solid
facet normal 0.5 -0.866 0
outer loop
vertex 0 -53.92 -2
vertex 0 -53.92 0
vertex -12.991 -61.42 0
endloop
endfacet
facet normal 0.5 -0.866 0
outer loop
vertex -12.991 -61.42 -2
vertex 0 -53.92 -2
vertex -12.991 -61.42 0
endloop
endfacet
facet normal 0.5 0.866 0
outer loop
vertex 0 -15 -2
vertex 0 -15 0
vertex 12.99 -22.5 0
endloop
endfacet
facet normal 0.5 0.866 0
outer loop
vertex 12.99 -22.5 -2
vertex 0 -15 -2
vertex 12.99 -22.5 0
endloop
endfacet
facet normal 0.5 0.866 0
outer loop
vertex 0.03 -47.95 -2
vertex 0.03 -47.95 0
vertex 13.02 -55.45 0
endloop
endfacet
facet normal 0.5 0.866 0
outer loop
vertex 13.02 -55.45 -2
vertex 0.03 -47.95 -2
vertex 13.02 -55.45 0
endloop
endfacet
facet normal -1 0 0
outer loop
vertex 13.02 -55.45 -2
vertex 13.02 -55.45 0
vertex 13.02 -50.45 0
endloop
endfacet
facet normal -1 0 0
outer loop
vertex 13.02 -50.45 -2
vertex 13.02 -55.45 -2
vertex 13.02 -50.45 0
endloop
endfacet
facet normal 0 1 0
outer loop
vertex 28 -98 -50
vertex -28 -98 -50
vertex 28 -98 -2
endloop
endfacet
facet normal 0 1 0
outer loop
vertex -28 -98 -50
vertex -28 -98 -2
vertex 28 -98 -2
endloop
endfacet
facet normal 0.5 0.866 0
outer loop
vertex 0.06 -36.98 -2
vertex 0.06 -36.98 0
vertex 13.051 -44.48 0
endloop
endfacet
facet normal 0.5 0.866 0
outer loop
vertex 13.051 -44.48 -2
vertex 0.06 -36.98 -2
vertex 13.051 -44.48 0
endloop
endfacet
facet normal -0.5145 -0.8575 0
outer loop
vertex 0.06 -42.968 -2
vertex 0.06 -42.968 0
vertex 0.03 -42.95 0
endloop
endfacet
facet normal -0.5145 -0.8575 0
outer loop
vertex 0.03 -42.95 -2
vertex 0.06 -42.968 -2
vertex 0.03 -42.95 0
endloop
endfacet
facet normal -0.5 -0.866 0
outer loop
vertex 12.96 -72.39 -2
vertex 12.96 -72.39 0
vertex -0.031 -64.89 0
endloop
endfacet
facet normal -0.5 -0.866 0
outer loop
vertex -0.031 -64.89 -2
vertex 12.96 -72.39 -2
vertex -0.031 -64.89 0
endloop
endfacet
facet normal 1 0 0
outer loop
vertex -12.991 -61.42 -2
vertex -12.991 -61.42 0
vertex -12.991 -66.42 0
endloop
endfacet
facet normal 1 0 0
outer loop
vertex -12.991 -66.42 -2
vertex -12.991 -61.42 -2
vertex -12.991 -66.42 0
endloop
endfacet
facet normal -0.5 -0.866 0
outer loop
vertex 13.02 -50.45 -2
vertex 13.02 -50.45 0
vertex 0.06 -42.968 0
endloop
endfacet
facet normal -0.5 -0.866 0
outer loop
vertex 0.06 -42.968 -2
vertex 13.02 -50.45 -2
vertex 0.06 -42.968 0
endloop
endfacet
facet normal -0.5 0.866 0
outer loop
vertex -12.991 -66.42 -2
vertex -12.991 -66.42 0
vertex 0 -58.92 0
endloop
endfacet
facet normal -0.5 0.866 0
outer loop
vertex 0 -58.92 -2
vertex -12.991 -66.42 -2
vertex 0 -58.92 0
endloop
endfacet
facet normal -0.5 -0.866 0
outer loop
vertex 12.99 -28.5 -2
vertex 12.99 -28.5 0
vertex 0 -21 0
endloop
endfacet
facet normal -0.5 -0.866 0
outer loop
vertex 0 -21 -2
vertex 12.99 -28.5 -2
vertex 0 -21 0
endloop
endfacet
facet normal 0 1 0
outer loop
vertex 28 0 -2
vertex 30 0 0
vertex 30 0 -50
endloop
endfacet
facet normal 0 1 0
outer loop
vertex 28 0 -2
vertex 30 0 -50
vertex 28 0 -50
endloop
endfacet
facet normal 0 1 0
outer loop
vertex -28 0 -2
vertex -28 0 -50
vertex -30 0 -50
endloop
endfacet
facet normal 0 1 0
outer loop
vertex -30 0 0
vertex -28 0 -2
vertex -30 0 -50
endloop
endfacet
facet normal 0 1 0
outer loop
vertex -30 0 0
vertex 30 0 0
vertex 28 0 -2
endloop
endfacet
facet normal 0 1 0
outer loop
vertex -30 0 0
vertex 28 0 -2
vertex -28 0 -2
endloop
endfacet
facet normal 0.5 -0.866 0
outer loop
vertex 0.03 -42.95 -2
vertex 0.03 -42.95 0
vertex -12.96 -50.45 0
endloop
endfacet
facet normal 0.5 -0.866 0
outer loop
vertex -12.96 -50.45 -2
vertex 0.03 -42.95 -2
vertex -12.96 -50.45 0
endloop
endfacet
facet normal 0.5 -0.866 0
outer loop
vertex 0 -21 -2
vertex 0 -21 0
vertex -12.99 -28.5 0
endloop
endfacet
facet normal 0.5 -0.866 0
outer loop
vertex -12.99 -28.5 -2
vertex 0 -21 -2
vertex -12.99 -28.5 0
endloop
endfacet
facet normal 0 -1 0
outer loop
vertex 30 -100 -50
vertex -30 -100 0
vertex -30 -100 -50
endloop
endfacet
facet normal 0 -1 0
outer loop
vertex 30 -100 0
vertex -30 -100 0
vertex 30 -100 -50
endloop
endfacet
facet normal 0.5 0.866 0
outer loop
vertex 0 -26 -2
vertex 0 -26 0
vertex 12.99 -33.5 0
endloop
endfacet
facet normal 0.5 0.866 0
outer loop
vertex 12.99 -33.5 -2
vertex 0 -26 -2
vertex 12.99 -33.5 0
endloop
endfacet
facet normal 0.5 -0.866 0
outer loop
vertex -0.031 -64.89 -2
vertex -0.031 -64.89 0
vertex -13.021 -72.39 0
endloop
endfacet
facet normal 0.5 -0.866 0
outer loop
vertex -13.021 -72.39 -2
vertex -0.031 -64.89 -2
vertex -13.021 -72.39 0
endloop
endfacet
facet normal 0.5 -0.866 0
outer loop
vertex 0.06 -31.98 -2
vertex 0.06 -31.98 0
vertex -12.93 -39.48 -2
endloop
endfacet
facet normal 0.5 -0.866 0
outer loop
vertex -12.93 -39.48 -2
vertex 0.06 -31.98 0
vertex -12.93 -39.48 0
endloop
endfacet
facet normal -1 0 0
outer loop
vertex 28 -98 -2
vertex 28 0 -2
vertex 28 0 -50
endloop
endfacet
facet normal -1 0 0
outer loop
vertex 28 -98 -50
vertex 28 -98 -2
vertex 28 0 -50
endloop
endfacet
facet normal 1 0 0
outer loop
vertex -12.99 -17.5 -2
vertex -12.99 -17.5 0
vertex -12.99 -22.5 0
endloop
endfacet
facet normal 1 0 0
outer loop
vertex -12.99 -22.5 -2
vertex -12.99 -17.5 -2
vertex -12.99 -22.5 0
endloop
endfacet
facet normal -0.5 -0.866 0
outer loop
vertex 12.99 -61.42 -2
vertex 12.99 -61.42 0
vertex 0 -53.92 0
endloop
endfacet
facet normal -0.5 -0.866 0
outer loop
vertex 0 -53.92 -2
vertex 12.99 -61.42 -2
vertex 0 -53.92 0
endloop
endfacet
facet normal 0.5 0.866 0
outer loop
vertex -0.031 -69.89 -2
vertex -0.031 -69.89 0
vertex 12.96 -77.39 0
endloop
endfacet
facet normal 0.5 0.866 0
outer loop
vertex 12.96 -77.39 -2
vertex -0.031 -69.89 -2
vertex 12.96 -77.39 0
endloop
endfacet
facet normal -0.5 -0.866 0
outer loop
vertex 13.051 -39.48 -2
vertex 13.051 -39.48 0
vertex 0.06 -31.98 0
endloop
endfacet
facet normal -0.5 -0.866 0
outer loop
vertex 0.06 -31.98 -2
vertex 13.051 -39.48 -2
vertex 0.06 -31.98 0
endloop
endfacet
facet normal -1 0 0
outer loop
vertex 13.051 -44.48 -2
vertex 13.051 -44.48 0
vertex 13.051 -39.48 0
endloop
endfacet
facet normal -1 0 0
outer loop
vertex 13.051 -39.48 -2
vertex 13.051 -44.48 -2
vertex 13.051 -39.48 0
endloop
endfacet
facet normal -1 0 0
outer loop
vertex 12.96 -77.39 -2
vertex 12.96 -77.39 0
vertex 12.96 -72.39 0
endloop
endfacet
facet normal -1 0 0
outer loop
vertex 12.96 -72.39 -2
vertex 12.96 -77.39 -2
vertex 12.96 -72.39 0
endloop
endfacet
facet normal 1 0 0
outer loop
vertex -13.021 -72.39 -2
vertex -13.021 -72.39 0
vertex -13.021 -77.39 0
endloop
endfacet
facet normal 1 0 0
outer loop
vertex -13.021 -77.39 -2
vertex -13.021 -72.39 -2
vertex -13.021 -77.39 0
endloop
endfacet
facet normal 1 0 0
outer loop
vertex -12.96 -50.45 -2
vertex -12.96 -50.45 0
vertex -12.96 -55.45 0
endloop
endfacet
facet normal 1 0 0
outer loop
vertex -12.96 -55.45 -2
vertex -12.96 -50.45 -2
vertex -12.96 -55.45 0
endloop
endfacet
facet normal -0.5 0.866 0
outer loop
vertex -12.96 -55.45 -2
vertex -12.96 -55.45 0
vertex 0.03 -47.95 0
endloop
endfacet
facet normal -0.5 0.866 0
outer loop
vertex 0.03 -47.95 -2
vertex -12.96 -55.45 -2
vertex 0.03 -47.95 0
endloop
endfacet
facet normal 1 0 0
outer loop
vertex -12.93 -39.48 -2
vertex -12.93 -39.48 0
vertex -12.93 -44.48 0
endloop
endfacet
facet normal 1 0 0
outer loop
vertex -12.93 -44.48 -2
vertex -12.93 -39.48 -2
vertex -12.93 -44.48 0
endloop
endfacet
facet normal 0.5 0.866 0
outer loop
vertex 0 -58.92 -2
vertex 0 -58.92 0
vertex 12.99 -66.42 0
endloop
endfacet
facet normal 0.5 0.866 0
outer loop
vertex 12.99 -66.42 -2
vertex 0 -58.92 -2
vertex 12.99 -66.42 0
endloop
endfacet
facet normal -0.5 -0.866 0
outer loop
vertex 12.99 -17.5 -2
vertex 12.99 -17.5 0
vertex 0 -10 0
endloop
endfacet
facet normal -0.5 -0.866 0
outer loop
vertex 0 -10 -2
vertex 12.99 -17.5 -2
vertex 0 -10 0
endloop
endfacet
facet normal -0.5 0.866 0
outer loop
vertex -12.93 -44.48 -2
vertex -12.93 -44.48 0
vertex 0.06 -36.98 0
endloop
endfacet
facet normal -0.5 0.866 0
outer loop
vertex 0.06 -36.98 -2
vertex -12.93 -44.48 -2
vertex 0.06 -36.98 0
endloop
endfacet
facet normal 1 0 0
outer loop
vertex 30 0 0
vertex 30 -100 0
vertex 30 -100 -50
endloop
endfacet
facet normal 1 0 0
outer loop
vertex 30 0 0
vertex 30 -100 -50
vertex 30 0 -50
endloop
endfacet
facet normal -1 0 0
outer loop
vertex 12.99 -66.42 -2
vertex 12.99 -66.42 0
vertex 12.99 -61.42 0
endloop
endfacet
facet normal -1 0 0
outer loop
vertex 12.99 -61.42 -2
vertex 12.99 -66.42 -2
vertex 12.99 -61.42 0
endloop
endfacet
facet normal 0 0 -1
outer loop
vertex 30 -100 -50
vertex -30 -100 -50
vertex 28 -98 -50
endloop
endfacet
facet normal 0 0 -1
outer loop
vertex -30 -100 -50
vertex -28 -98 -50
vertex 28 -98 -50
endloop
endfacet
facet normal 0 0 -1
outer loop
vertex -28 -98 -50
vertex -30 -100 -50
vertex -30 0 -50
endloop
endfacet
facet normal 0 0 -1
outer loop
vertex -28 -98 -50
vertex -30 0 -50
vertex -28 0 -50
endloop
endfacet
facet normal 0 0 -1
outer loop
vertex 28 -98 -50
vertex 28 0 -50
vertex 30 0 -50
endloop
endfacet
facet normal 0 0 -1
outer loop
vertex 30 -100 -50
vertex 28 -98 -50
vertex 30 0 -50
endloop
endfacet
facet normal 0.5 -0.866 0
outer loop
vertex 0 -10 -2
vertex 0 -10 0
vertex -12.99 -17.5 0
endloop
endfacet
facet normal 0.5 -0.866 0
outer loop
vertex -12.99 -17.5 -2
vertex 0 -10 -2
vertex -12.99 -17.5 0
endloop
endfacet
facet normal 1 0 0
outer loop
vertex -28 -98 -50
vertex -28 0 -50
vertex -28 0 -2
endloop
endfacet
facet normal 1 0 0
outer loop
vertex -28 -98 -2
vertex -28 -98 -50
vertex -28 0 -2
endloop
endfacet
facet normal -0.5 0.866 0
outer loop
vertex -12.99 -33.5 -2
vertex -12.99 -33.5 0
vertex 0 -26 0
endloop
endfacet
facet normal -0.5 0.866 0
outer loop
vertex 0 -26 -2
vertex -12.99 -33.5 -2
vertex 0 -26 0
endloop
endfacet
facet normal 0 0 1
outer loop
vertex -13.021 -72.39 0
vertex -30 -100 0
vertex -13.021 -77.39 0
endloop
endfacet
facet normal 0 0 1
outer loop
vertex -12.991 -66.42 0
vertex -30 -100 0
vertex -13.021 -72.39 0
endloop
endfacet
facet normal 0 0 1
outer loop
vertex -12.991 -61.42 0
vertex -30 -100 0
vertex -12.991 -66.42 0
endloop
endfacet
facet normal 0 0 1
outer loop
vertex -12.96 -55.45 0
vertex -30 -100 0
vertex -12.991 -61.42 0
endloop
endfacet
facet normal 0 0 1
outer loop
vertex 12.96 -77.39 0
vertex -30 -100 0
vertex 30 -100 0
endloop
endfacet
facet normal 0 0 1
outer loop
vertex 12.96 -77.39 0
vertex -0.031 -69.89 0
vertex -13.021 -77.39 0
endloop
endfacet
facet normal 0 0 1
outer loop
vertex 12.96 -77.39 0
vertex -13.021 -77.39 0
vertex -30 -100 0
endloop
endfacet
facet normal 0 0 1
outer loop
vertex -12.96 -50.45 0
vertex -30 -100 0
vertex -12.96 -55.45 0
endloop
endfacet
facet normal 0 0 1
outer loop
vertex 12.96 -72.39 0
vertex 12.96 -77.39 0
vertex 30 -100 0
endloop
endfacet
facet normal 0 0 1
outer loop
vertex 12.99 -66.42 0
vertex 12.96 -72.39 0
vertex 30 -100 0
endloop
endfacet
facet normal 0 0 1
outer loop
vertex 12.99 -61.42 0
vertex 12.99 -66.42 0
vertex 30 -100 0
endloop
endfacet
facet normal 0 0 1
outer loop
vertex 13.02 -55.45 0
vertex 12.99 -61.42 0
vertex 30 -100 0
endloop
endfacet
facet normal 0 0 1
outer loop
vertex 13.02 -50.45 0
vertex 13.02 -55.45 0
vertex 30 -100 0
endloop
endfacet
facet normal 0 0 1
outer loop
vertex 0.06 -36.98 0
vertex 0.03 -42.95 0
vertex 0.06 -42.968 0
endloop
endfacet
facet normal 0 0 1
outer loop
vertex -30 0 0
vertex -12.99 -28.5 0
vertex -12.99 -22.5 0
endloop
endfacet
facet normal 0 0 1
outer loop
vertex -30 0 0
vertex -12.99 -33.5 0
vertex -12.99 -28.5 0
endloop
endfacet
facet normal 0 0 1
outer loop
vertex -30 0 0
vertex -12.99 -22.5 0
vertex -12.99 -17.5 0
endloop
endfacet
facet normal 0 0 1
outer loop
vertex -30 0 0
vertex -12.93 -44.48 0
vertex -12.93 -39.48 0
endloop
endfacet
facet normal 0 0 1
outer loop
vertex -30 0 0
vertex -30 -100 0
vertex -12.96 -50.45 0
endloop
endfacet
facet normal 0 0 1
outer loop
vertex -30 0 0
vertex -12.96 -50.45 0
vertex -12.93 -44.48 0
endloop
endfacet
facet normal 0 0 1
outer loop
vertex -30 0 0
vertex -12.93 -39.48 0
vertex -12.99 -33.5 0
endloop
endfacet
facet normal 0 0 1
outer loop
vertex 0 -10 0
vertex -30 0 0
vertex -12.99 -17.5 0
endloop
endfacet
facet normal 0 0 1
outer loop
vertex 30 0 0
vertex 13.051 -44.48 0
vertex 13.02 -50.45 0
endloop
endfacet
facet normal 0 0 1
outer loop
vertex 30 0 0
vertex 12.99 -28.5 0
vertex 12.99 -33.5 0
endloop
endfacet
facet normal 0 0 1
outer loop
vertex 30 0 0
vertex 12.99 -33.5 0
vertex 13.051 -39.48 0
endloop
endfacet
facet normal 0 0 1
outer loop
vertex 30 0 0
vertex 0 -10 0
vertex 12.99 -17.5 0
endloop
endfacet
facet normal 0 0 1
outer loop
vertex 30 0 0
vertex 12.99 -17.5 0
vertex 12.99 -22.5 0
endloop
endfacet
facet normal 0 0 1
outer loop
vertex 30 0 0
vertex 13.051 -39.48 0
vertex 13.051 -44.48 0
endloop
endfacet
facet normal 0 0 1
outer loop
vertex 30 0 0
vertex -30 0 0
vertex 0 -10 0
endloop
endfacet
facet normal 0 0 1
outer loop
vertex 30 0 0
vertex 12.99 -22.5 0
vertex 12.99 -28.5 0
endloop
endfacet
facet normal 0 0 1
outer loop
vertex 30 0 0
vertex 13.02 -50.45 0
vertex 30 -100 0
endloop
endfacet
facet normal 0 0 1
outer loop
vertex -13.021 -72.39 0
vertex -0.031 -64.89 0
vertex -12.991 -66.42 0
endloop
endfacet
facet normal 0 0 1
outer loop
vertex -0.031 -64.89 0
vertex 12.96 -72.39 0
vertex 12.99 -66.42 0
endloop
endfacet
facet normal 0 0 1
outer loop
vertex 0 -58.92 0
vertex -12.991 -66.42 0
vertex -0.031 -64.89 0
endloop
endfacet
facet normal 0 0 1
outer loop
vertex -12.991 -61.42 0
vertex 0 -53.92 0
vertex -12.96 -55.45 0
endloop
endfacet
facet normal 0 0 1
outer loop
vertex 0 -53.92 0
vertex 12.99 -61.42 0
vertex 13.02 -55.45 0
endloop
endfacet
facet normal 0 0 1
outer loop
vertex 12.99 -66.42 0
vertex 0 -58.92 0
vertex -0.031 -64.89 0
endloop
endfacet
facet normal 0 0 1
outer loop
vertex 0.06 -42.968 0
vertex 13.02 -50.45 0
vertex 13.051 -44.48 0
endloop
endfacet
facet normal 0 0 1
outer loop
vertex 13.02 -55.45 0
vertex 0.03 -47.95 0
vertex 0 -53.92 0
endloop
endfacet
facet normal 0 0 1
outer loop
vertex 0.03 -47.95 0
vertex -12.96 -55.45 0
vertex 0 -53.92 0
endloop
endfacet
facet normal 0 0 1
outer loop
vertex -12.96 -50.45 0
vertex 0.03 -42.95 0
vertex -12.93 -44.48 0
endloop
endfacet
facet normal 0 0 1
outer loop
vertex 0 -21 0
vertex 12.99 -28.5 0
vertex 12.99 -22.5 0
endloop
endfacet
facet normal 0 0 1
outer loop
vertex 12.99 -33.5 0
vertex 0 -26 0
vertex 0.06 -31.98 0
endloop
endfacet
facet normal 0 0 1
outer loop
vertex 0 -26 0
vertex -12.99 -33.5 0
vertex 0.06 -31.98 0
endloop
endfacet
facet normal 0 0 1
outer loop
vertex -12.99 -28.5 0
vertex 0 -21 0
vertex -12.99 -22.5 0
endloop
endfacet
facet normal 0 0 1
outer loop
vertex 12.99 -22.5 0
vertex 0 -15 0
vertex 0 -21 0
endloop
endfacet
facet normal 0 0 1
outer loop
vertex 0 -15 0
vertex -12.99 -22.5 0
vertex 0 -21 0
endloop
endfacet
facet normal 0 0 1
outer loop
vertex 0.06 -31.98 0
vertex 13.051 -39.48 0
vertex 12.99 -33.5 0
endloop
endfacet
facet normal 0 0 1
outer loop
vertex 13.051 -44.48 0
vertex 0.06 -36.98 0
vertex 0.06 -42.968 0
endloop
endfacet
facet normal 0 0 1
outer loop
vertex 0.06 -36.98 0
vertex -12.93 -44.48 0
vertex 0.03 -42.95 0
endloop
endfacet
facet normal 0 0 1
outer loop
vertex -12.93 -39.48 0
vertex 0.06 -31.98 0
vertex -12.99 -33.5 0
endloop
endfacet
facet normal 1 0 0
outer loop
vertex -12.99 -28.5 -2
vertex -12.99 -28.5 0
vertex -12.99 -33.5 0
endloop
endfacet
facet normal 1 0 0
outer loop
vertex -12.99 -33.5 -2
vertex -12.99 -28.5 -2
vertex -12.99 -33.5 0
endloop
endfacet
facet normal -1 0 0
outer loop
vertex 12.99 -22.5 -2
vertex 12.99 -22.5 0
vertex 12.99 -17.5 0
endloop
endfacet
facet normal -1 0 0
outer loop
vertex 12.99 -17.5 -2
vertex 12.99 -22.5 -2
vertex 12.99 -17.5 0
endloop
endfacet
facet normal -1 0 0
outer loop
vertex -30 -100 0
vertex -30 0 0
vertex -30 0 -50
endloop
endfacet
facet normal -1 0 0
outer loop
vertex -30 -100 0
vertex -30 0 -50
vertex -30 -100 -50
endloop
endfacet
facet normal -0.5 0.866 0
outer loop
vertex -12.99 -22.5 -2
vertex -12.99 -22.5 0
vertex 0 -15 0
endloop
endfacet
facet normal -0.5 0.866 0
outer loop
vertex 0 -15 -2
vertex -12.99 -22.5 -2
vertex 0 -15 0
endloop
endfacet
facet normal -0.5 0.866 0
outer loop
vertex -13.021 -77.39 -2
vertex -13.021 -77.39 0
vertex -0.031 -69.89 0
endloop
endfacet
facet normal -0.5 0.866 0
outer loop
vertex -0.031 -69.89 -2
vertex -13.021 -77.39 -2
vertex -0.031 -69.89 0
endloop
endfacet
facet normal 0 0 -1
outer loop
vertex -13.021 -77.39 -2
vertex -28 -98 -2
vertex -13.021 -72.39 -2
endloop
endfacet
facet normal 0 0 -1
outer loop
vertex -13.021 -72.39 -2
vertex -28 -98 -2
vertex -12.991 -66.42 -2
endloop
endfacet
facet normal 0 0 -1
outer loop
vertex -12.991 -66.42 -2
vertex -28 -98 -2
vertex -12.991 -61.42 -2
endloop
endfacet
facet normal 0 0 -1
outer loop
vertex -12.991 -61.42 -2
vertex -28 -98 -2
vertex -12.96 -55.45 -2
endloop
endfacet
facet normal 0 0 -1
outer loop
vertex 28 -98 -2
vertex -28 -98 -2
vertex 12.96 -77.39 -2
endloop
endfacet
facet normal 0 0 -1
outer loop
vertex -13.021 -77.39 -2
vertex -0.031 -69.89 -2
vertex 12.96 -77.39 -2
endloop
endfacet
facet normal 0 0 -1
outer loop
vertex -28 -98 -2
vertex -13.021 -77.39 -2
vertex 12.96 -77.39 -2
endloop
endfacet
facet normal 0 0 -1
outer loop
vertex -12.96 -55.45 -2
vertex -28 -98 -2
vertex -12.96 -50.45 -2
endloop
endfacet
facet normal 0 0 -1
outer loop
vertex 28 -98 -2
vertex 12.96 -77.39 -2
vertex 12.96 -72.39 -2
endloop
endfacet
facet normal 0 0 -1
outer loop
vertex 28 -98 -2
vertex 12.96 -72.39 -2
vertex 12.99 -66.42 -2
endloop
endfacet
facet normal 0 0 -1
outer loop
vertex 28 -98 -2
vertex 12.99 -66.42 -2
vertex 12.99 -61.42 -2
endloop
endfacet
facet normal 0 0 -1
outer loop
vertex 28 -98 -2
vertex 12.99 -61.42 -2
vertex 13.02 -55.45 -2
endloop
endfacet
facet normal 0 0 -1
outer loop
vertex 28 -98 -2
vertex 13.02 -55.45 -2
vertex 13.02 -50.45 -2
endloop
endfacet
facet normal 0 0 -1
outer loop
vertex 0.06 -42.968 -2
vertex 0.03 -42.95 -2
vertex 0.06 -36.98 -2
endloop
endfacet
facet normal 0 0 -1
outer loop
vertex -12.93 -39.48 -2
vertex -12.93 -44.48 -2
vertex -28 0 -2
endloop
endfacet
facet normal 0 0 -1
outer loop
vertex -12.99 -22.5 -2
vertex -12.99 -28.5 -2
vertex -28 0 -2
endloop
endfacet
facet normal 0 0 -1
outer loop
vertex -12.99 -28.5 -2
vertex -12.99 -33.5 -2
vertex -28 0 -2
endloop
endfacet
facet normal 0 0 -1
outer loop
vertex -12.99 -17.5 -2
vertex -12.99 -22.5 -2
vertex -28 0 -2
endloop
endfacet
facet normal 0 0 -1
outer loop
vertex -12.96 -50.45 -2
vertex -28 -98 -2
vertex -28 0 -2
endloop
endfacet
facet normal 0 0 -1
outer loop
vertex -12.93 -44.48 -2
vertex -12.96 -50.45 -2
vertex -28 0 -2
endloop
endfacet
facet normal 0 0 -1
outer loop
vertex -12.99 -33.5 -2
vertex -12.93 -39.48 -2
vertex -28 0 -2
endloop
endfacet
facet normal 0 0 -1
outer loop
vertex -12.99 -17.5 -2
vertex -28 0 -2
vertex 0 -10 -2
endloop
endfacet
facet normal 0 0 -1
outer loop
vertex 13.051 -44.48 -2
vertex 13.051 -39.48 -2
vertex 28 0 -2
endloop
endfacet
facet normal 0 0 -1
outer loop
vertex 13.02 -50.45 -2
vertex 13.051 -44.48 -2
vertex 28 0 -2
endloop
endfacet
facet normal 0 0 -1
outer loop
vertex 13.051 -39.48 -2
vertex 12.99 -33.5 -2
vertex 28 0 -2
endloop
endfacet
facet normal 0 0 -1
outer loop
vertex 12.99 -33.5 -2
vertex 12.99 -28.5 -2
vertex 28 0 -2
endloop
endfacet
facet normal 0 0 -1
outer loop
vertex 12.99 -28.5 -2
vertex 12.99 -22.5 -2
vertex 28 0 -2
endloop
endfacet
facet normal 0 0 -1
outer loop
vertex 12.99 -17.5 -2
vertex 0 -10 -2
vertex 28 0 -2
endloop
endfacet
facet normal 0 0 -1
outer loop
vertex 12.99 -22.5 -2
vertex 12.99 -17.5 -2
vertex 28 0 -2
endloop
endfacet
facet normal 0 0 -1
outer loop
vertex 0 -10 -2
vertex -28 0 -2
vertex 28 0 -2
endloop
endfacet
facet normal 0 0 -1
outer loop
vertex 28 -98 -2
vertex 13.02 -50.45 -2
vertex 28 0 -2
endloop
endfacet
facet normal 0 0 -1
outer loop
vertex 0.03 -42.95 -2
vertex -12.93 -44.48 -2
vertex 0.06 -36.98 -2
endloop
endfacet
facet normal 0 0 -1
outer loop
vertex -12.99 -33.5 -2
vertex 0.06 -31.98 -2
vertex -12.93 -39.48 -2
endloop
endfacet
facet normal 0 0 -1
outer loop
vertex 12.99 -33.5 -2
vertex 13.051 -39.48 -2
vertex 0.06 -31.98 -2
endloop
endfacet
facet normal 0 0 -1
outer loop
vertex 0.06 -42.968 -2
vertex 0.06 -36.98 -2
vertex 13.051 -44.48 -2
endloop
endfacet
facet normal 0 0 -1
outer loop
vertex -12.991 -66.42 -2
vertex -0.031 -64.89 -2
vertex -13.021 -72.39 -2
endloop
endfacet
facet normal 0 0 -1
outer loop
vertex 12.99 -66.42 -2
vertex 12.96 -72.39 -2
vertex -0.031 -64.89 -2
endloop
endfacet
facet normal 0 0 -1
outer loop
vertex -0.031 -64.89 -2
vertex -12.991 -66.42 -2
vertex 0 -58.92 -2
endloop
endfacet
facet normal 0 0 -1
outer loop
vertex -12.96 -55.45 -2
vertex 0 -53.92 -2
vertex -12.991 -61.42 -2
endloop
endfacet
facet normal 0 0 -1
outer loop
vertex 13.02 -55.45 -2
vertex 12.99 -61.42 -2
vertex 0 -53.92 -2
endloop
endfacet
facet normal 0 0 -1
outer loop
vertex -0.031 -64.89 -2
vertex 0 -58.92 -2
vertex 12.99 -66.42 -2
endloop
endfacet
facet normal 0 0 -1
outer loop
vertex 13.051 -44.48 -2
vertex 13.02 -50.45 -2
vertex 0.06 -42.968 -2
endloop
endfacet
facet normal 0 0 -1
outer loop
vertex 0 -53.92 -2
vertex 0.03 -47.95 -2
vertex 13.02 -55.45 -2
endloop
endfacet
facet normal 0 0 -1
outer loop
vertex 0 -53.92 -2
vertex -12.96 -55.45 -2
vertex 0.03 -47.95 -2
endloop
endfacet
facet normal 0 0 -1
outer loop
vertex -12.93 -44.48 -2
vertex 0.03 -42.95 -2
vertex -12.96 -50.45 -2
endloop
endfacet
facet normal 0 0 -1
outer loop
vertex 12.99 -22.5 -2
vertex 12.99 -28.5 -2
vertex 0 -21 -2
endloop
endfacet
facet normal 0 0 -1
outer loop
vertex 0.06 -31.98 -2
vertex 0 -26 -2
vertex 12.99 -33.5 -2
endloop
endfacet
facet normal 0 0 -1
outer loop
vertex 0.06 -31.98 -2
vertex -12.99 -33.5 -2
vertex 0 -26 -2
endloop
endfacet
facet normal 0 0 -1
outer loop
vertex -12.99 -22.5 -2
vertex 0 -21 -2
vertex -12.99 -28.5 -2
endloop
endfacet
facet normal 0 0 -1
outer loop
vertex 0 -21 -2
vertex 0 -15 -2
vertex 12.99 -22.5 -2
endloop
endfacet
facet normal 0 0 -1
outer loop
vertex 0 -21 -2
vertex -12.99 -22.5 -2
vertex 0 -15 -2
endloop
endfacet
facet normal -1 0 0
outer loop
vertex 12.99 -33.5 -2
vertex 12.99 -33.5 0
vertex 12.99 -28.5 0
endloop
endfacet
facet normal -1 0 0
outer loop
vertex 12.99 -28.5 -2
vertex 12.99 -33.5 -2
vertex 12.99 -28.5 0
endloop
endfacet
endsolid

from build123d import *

# Parameters (mm, degrees)
F1_DEPTH = 50
F2_T     = -2
F4_DEPTH = 10
F6_DEPTH = 5
F7_W     = 56
F7_H     = 2
F8_DEPTH = 25


with BuildPart() as f1:
    # F0 (on Top) → F1 (new body)
    with BuildSketch(Plane.XY):
        Polygon((30, 0), (0, 0), (-30, 0), (-30, -100), (30, -100), align=None)
    extrude(amount=-F1_DEPTH)

    # F2
    f2_openings = [f1.faces().sort_by_distance(p)[0] for p in [
        (0, -50, -50),
    ]]
    offset(amount=F2_T, openings=f2_openings)

    # F3 (on face) → F4 (cut)
    with BuildSketch(Plane.XY):
        Polygon((12.990381, -17.5), (0, -10), (-12.990381, -17.5), (-12.990381, -22.5), (0, -15), (12.990381, -22.5), align=None)
        Polygon((12.990381, -28.5), (0, -21), (-12.990381, -28.5), (-12.990381, -33.5), (0, -26), (12.990381, -33.5), align=None)
        Polygon((13.050762, -39.48), (0.060381, -31.98), (-12.93, -39.48), (-12.93, -44.48), (0.060381, -36.98), (13.050762, -44.48), align=None)
        Polygon((13.020381, -50.45), (0.060381, -42.967541), (0.03, -42.95), (-12.960381, -50.45), (-12.960381, -55.45), (0.03, -47.95), (13.020381, -55.45), align=None)
        Polygon((-12.990762, -66.42), (-0.000381, -58.92), (12.99, -66.42), (12.99, -61.42), (-0.000381, -53.92), (-12.990762, -61.42), align=None)
        Polygon((-13.021143, -77.39), (-0.030762, -69.89), (12.959619, -77.39), (12.959619, -72.39), (-0.030762, -64.89), (-13.021143, -72.39), align=None)
    extrude(amount=-F4_DEPTH, mode=Mode.SUBTRACT)

    # F5 (on face) → F6 (cut)
    with BuildSketch(Plane(origin=(0, 0, 0), x_dir=(-1, 0, 0), z_dir=(0, 1, 0))):
        Polygon((28, -2), (0, -2), (-28, -2), (-28, -25), (-28, -48), (0, -48), (28, -48), (28, -25), align=None)
    extrude(amount=-F6_DEPTH, mode=Mode.SUBTRACT)

    # F7 (on face) → F8 (cut)
    with BuildSketch(Plane(origin=(0, 0, 0), x_dir=(-1, 0, 0), z_dir=(0, 1, 0))):
        with Locations((0, -49)):
            Rectangle(F7_W, F7_H)
    extrude(amount=-F8_DEPTH, mode=Mode.SUBTRACT)


solid = f1.part
